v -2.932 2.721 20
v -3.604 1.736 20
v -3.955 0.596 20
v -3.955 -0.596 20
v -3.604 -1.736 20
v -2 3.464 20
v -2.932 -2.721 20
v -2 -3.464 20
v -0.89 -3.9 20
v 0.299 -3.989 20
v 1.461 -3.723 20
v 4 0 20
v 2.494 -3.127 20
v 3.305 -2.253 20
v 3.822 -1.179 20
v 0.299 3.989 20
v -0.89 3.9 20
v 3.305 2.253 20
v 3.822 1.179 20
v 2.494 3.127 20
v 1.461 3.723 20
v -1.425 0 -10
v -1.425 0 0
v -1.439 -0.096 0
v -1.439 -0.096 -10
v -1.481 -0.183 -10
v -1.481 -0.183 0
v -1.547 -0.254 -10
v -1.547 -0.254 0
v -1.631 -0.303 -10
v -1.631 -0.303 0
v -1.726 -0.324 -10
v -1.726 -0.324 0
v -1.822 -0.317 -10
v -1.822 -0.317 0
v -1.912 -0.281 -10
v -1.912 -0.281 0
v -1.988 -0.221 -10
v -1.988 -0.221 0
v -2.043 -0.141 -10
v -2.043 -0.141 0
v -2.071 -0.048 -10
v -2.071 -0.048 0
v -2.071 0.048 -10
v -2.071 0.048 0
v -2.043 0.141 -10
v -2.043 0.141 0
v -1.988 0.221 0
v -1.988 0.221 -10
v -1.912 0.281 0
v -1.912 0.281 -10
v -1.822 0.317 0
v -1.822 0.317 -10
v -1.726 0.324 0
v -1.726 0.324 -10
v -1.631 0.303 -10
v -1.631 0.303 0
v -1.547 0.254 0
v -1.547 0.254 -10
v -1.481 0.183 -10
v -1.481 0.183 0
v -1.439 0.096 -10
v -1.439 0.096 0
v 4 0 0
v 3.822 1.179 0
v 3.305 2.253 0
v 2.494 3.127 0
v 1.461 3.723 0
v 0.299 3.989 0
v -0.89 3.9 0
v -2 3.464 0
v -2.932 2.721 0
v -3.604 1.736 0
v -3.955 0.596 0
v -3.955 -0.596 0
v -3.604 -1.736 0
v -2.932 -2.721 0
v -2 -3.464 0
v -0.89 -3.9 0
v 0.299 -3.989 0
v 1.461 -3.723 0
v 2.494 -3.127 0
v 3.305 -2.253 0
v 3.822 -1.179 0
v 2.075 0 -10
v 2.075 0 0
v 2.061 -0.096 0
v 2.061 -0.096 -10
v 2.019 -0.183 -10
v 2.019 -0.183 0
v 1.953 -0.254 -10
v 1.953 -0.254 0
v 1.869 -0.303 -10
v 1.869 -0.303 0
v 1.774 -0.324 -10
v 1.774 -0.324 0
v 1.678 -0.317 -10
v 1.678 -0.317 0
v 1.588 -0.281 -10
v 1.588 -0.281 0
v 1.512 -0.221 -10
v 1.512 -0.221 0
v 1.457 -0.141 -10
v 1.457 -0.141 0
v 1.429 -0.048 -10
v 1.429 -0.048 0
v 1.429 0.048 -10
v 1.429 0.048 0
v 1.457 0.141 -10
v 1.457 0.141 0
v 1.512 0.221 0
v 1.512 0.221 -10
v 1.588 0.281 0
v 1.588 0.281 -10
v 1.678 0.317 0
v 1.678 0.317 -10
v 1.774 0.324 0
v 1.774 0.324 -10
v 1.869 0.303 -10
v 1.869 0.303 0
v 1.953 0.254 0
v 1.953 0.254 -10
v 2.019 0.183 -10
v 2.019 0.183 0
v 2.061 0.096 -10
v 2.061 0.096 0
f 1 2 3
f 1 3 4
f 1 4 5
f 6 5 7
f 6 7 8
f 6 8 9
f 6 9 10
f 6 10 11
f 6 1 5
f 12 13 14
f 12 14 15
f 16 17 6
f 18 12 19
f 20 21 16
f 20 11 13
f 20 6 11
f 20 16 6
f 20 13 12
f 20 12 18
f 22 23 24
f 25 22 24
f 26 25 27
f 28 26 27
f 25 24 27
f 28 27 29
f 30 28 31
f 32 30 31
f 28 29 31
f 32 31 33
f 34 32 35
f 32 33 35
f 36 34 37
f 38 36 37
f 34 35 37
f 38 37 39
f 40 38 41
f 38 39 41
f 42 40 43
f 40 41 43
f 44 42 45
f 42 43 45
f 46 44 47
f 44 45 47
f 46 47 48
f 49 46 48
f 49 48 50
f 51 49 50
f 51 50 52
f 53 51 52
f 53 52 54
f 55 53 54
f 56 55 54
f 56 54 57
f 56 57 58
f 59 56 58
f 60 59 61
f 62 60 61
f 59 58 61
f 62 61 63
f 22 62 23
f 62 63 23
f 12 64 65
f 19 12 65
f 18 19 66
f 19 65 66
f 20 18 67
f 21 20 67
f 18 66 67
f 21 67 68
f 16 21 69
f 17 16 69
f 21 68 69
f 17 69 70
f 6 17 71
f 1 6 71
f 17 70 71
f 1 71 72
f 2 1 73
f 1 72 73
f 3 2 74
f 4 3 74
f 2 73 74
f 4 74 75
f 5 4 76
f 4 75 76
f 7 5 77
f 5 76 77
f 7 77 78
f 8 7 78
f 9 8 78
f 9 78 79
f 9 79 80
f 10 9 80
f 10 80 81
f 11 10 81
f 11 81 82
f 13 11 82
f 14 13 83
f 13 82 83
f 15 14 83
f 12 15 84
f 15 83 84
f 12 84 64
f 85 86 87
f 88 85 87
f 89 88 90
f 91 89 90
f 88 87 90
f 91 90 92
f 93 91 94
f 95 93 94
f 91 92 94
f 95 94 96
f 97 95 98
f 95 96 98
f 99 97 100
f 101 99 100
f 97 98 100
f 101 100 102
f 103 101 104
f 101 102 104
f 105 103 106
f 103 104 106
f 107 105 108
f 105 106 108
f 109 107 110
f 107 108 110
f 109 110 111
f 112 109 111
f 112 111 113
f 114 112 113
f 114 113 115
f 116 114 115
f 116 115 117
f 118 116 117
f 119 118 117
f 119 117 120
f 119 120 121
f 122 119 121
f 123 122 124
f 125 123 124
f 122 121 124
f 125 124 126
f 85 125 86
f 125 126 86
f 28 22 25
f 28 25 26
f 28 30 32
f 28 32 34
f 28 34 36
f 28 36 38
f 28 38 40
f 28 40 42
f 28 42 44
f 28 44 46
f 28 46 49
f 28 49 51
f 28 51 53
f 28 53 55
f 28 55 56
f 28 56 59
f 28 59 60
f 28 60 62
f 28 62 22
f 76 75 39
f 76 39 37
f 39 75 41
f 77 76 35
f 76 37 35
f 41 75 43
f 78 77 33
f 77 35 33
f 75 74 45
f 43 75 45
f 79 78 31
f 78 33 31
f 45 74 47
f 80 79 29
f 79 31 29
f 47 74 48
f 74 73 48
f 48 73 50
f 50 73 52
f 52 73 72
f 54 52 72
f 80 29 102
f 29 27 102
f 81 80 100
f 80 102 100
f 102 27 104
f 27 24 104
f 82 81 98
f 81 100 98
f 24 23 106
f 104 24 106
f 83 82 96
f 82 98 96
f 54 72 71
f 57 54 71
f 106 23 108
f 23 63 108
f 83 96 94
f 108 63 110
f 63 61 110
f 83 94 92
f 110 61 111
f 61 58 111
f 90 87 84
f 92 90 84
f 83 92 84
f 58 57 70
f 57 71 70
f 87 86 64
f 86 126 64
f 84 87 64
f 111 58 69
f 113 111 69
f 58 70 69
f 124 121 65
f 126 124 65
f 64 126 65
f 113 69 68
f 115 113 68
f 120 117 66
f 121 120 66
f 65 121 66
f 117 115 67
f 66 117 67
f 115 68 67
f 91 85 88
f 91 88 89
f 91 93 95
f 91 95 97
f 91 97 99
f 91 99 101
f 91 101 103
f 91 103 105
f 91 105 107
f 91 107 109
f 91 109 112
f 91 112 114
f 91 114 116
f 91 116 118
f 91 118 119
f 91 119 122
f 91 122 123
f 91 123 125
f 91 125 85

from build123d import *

# Parameters (mm, degrees)
F0_R     = 4
F1_DEPTH = 20
F2_R     = 0.325
F3_DEPTH = 10


with BuildPart() as f1:
    # F0 (on Top) → F1 (new body)
    with BuildSketch(Plane.XY):
        Circle(F0_R)
    extrude(amount=F1_DEPTH)

    # F2 (on face) → F3 (join)
    with BuildSketch(Plane(origin=(0, 0, 0), x_dir=(1, 0, 0), z_dir=(0, 0, -1))):
        with Locations((-1.75, 0)):
            Circle(F2_R)
        with Locations((1.75, 0)):
            Circle(F2_R)
    extrude(amount=F3_DEPTH)


solid = f1.part
